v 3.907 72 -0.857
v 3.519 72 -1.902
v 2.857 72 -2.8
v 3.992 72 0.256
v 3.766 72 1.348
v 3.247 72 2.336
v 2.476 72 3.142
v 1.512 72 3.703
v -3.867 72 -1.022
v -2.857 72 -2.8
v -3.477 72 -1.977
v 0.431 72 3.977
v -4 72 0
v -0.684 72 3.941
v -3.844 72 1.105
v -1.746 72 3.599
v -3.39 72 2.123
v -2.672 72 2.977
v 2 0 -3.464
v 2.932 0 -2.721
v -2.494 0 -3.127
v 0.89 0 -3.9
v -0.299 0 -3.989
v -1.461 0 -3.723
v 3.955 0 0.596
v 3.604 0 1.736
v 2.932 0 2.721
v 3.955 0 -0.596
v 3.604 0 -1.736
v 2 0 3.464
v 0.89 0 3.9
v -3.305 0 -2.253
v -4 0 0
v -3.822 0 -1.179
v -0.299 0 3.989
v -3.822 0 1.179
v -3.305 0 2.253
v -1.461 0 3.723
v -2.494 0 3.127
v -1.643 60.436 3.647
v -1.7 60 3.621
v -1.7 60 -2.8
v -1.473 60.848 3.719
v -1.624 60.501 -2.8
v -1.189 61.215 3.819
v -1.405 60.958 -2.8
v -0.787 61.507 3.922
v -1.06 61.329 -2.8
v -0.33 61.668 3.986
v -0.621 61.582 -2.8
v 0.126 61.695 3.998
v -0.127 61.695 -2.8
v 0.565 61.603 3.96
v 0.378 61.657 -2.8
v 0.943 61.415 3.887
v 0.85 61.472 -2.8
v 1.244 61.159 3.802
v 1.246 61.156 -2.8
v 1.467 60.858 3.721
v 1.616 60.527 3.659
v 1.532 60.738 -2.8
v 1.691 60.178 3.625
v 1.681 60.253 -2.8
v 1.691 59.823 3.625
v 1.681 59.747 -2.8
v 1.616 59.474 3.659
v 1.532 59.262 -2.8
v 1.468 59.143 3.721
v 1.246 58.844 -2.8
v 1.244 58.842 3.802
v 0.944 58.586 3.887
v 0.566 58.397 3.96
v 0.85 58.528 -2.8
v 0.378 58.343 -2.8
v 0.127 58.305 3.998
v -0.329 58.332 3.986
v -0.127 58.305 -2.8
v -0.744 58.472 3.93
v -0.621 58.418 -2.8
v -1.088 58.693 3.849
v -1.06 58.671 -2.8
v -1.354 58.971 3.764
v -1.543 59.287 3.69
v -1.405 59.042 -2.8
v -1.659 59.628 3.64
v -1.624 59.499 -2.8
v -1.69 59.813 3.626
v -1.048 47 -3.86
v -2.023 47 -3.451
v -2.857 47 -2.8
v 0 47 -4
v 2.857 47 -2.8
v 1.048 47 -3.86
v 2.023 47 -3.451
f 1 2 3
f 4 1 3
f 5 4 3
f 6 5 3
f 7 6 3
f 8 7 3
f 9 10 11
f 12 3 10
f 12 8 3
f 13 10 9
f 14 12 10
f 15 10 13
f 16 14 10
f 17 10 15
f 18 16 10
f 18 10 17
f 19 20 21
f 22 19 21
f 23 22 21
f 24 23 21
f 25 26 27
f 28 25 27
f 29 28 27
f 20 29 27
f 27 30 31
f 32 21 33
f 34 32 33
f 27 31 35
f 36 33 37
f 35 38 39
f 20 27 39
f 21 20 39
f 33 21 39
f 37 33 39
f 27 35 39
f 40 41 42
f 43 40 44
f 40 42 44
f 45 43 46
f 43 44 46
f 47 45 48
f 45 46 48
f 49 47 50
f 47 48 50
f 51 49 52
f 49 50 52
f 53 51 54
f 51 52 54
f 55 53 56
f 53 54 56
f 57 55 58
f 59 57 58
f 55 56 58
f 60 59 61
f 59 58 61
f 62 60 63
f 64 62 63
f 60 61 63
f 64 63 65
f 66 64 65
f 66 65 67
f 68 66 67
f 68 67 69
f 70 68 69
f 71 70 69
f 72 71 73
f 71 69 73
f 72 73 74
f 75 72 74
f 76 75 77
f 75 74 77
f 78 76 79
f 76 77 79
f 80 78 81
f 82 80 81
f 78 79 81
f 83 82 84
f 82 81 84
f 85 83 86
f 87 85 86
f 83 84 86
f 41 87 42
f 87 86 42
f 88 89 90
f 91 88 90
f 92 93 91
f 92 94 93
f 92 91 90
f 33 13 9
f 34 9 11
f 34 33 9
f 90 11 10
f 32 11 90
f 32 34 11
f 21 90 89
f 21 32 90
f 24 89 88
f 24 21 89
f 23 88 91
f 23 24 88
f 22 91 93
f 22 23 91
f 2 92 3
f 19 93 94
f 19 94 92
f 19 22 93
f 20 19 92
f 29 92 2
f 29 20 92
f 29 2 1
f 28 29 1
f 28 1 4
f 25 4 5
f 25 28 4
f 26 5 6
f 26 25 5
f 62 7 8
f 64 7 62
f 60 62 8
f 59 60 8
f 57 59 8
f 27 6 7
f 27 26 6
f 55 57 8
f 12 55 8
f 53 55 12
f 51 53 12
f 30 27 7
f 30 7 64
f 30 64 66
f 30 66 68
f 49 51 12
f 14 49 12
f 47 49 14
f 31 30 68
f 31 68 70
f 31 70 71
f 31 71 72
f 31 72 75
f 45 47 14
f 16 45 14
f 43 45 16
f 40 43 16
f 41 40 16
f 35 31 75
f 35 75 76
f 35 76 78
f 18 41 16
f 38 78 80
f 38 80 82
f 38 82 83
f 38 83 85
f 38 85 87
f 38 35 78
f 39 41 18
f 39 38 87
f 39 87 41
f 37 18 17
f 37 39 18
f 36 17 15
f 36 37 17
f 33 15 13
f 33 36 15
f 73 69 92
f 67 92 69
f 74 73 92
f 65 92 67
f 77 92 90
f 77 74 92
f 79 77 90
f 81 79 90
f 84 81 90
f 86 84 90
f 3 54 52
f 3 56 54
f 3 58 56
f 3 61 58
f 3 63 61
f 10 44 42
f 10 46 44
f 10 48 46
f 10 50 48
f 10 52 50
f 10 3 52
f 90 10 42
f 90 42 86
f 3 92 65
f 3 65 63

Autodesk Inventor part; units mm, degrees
ref_plane "YZ Plane" through (0, 0, 0) normal (1, 0, 0) x (0, 1, 0)
ref_plane "XZ Plane" through (0, 0, 0) normal (0, 1, 0) x (-1, 0, 0)
ref_plane "XY Plane" through (0, 0, 0) normal (0, 0, 1) x (1, 0, 0)
sketch "スケッチ2" plane through (0, 0, 0) normal (0, 1, 0) x (-1, 0, 0)
  circle A0 centre (0, 0) radius 4
  dimension "d0" = 8
extrude "押し出し1" add sketch "スケッチ2" along normal blind 72
sketch "スケッチ3" plane through (0, 72, 0) normal (0, 1, 0) x (1, 0, 0)
  line L0 (-4.1769, 6.014) -> (4.0611, 6.014)
  line L1 (4.0611, 6.014) -> (4.0611, 2.8)
  line L2 (4.0611, 2.8) -> (-4.1769, 2.8)
  line L3 (-4.1769, 2.8) -> (-4.1769, 6.014)
  point P0 (0, 0)
  dimension "d3" = 2.8
extrude "押し出し2" cut sketch "スケッチ3" against normal blind 25
sketch "スケッチ4" plane through (2.8566, 72, -2.8) normal (0, 0, -1) x (-1, 0, 0)
  line L0 (6.8566, 0) -> (-1.1434, 0) projected
  line L1 (2.8566, 0) -> (2.8566, -27.2038) construction
  circle A0 centre (2.8566, -12) radius 1.7
  point P0 (2.8566, -72)
  point P1 (5.7131, 0)
  point P2 (0, 0)
  dimension "d6" = 3.4
  dimension "d7" = 12
extrude "押し出し3" cut sketch "スケッチ4" against normal through all
properties part number "Rotary_Feedthorough_top"
